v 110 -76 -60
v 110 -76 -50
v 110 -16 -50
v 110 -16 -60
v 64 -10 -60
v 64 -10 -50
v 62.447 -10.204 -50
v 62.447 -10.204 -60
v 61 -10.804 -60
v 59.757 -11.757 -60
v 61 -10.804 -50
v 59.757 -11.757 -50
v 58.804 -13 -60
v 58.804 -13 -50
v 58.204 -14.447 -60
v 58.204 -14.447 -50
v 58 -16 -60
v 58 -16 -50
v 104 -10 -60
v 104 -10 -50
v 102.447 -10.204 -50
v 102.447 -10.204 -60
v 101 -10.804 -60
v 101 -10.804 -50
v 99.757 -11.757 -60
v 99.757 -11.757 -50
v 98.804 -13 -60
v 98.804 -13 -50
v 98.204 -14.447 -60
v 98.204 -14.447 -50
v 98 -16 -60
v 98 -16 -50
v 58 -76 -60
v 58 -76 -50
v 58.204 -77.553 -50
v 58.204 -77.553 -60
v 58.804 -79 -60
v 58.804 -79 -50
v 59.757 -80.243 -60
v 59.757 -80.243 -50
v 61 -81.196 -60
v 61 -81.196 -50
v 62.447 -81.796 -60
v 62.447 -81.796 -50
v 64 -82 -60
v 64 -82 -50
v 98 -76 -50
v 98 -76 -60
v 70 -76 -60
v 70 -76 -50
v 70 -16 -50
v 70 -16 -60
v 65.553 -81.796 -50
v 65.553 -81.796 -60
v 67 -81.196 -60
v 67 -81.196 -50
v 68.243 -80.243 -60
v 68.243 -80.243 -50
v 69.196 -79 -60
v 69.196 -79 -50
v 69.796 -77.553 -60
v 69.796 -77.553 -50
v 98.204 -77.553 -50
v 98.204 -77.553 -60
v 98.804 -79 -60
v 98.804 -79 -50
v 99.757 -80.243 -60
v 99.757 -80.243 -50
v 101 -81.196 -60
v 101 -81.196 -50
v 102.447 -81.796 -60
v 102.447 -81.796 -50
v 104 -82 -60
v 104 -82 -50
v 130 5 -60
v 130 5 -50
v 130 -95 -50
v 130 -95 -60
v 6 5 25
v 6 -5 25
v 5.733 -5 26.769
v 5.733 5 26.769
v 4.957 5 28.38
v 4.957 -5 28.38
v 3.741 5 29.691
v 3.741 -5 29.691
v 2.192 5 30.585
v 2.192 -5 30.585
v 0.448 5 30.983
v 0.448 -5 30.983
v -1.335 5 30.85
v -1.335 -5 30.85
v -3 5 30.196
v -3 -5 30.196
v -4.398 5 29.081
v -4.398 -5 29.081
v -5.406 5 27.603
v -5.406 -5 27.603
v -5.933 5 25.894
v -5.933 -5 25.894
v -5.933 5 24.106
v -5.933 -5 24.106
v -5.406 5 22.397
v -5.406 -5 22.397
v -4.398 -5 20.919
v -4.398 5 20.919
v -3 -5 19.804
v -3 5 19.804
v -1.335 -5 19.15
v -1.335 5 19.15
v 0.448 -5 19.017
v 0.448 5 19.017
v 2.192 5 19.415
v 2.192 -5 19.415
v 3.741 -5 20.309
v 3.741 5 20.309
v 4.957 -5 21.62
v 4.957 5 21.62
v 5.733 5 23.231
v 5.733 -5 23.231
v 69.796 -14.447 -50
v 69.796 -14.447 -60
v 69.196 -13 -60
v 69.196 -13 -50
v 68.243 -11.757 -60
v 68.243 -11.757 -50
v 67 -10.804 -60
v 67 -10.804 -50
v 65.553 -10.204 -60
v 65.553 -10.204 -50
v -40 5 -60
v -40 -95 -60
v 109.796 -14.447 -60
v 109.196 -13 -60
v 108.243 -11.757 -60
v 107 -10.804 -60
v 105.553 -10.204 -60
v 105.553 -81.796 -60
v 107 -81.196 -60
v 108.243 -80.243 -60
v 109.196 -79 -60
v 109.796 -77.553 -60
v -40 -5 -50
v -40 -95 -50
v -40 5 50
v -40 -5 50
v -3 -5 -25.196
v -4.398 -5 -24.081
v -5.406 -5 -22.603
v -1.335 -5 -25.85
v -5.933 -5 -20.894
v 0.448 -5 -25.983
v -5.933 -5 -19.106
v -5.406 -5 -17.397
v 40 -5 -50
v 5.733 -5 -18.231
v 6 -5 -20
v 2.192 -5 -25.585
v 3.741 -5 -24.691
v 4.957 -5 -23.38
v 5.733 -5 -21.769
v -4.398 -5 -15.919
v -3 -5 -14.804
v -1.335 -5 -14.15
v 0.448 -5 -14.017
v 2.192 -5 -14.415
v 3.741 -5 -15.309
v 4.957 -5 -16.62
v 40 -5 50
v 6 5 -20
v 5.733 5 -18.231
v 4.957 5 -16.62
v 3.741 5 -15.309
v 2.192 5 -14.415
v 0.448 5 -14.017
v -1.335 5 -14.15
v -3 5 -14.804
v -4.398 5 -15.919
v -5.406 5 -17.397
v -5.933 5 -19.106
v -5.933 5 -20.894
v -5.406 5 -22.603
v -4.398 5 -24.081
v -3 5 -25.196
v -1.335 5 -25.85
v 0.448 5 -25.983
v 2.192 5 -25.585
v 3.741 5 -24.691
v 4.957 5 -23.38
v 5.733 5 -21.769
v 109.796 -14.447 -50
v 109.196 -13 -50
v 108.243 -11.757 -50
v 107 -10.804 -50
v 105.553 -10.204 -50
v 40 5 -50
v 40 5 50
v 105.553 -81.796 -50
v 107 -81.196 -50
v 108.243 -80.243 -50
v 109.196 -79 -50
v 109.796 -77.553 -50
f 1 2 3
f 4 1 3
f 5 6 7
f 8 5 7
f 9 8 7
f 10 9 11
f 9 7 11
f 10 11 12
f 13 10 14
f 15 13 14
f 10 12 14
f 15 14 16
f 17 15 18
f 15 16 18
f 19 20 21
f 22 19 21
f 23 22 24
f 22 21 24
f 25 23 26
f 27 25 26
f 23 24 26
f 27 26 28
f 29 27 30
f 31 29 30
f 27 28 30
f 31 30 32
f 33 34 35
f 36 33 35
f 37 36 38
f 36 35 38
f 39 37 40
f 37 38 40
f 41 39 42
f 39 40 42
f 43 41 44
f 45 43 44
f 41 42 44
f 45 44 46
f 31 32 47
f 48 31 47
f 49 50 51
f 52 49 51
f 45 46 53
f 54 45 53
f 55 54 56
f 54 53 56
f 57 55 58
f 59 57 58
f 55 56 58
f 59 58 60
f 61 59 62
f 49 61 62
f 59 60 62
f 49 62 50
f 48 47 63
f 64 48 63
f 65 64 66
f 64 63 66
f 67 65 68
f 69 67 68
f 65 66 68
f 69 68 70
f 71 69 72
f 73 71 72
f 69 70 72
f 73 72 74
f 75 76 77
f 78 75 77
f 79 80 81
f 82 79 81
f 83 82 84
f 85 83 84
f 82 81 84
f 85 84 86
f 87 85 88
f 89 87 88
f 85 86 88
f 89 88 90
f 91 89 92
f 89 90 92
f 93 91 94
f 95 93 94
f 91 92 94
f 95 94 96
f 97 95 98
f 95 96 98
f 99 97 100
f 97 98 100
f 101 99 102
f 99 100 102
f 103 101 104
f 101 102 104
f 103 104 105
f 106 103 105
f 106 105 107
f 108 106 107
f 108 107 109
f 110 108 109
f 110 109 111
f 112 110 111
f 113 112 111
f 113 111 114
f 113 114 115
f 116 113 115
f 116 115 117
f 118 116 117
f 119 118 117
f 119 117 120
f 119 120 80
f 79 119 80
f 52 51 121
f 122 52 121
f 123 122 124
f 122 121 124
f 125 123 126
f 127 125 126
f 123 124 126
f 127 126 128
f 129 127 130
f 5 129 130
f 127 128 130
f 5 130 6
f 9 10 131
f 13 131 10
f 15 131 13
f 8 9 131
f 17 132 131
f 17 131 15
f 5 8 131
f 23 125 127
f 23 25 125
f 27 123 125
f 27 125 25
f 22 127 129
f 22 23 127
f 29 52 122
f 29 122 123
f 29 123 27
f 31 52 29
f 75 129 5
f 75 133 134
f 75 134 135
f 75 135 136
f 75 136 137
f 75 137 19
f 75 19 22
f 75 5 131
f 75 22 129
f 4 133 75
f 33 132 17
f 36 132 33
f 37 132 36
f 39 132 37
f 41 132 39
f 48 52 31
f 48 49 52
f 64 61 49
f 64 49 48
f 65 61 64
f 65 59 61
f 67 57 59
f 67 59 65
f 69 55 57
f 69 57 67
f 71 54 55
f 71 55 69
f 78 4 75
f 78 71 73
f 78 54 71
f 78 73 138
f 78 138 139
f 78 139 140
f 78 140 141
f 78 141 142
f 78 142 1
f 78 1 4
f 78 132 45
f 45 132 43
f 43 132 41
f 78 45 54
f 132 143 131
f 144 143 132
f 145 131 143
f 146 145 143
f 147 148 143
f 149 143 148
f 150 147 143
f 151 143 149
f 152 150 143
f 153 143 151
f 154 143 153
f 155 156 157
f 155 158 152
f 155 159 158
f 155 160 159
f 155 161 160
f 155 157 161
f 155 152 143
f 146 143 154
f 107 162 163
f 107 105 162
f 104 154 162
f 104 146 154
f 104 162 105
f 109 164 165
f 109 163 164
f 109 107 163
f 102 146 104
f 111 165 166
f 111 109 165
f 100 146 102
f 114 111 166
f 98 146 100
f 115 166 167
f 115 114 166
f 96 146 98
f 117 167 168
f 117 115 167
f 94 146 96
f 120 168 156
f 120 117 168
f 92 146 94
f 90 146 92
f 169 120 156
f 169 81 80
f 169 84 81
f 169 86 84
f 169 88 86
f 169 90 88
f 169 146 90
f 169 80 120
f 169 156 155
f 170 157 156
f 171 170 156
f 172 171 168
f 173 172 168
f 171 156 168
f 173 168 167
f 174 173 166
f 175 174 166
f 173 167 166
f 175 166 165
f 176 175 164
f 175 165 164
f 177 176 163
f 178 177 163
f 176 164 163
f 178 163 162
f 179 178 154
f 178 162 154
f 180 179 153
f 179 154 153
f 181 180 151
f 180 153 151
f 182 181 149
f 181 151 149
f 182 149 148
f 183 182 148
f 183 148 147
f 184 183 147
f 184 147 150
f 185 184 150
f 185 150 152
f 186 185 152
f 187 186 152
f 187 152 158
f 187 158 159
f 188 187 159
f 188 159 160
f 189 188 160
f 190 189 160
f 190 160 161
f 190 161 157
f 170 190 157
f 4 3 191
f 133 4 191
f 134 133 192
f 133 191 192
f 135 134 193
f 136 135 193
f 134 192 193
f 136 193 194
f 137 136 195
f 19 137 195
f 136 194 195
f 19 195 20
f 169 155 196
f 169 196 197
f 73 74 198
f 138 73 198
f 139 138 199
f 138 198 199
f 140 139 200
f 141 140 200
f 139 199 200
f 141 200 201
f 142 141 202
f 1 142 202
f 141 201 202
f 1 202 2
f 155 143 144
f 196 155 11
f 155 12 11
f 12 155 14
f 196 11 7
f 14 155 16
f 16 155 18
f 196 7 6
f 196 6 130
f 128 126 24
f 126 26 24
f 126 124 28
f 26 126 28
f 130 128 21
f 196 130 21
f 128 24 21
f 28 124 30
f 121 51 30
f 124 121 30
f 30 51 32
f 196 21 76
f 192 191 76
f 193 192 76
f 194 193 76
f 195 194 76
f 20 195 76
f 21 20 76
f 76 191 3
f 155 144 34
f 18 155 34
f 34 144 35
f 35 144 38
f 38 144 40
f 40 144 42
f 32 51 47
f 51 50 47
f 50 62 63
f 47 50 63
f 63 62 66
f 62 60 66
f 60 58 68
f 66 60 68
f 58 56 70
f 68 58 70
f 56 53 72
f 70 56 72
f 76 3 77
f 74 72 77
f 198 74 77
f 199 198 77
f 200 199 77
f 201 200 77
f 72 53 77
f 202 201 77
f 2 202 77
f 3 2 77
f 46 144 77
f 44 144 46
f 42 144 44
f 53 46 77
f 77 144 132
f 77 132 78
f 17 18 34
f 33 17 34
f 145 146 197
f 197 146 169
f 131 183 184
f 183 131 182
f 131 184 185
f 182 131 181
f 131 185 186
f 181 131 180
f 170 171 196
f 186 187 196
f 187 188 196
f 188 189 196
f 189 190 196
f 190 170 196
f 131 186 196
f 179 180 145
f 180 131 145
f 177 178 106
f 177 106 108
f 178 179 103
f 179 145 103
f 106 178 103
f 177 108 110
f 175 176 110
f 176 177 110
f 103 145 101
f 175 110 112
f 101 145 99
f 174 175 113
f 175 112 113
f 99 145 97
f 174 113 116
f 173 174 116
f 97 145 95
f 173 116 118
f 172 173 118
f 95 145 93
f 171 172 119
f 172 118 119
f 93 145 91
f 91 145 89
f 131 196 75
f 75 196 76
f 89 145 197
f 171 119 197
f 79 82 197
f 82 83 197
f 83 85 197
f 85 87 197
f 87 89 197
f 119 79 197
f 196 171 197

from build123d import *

# Parameters (mm, degrees)
F0_W      = 80
F0_H      = 100
F1_DEPTH  = 5
F2_W      = 170
F2_H      = 100
F3_DEPTH  = 10
F4_R      = 6
F5_DEPTH  = 10
F7_DEPTH  = 25
F5_FACE_R = 6
F8_DEPTH  = 50


with BuildPart() as f1:
    # F0 (on Front) → F1 (new body, symmetric)
    with BuildSketch(Plane.XZ):
        Rectangle(F0_W, F0_H)
    extrude(amount=F1_DEPTH, both=True)

    # F2 (on face) → F3 (join)
    with BuildSketch(Plane(origin=(0, 0, -50), x_dir=(1, 0, 0), z_dir=(0, 0, -1))):
        with Locations((45, 45)):
            Rectangle(F2_W, F2_H)
    extrude(amount=F3_DEPTH)

    # F4 (on face) → F5 (join)
    with BuildSketch(Plane.XZ.offset(5)):
        with Locations((0, 25)):
            Circle(F4_R)
        with Locations((0, -20)):
            Circle(F4_R)
    extrude(amount=F5_DEPTH)

    # F6 (on face) → F7 (cut)
    with BuildSketch(Plane.XY.offset(-50)):
        with BuildLine():
            ThreePointArc((104, -10), (99.757359, -11.757359), (98, -16))
            Line((98, -16), (98, -76))
            ThreePointArc((98, -76), (99.757359, -80.242641), (104, -82))
            ThreePointArc((104, -82), (108.242641, -80.242641), (110, -76))
            Line((110, -76), (110, -16))
            ThreePointArc((110, -16), (108.242641, -11.757359), (104, -10))
        make_face()
        with BuildLine():
            ThreePointArc((64, -10), (59.757359, -11.757359), (58, -16))
            Line((58, -16), (58, -76))
            ThreePointArc((58, -76), (59.757359, -80.242641), (64, -82))
            ThreePointArc((64, -82), (68.242641, -80.242641), (70, -76))
            Line((70, -76), (70, -16))
            ThreePointArc((70, -16), (68.242641, -11.757359), (64, -10))
        make_face()
    extrude(amount=-F7_DEPTH, mode=Mode.SUBTRACT)

    # F5_face (on face) → F8 (cut)
    with BuildSketch(Plane(origin=(0, -15, 25), x_dir=(1, 0, 0), z_dir=(0, -1, 0))):
        Circle(F5_FACE_R)
        with Locations((0, -45)):
            Circle(F5_FACE_R)
    extrude(amount=-F8_DEPTH, mode=Mode.SUBTRACT)


solid = f1.part
